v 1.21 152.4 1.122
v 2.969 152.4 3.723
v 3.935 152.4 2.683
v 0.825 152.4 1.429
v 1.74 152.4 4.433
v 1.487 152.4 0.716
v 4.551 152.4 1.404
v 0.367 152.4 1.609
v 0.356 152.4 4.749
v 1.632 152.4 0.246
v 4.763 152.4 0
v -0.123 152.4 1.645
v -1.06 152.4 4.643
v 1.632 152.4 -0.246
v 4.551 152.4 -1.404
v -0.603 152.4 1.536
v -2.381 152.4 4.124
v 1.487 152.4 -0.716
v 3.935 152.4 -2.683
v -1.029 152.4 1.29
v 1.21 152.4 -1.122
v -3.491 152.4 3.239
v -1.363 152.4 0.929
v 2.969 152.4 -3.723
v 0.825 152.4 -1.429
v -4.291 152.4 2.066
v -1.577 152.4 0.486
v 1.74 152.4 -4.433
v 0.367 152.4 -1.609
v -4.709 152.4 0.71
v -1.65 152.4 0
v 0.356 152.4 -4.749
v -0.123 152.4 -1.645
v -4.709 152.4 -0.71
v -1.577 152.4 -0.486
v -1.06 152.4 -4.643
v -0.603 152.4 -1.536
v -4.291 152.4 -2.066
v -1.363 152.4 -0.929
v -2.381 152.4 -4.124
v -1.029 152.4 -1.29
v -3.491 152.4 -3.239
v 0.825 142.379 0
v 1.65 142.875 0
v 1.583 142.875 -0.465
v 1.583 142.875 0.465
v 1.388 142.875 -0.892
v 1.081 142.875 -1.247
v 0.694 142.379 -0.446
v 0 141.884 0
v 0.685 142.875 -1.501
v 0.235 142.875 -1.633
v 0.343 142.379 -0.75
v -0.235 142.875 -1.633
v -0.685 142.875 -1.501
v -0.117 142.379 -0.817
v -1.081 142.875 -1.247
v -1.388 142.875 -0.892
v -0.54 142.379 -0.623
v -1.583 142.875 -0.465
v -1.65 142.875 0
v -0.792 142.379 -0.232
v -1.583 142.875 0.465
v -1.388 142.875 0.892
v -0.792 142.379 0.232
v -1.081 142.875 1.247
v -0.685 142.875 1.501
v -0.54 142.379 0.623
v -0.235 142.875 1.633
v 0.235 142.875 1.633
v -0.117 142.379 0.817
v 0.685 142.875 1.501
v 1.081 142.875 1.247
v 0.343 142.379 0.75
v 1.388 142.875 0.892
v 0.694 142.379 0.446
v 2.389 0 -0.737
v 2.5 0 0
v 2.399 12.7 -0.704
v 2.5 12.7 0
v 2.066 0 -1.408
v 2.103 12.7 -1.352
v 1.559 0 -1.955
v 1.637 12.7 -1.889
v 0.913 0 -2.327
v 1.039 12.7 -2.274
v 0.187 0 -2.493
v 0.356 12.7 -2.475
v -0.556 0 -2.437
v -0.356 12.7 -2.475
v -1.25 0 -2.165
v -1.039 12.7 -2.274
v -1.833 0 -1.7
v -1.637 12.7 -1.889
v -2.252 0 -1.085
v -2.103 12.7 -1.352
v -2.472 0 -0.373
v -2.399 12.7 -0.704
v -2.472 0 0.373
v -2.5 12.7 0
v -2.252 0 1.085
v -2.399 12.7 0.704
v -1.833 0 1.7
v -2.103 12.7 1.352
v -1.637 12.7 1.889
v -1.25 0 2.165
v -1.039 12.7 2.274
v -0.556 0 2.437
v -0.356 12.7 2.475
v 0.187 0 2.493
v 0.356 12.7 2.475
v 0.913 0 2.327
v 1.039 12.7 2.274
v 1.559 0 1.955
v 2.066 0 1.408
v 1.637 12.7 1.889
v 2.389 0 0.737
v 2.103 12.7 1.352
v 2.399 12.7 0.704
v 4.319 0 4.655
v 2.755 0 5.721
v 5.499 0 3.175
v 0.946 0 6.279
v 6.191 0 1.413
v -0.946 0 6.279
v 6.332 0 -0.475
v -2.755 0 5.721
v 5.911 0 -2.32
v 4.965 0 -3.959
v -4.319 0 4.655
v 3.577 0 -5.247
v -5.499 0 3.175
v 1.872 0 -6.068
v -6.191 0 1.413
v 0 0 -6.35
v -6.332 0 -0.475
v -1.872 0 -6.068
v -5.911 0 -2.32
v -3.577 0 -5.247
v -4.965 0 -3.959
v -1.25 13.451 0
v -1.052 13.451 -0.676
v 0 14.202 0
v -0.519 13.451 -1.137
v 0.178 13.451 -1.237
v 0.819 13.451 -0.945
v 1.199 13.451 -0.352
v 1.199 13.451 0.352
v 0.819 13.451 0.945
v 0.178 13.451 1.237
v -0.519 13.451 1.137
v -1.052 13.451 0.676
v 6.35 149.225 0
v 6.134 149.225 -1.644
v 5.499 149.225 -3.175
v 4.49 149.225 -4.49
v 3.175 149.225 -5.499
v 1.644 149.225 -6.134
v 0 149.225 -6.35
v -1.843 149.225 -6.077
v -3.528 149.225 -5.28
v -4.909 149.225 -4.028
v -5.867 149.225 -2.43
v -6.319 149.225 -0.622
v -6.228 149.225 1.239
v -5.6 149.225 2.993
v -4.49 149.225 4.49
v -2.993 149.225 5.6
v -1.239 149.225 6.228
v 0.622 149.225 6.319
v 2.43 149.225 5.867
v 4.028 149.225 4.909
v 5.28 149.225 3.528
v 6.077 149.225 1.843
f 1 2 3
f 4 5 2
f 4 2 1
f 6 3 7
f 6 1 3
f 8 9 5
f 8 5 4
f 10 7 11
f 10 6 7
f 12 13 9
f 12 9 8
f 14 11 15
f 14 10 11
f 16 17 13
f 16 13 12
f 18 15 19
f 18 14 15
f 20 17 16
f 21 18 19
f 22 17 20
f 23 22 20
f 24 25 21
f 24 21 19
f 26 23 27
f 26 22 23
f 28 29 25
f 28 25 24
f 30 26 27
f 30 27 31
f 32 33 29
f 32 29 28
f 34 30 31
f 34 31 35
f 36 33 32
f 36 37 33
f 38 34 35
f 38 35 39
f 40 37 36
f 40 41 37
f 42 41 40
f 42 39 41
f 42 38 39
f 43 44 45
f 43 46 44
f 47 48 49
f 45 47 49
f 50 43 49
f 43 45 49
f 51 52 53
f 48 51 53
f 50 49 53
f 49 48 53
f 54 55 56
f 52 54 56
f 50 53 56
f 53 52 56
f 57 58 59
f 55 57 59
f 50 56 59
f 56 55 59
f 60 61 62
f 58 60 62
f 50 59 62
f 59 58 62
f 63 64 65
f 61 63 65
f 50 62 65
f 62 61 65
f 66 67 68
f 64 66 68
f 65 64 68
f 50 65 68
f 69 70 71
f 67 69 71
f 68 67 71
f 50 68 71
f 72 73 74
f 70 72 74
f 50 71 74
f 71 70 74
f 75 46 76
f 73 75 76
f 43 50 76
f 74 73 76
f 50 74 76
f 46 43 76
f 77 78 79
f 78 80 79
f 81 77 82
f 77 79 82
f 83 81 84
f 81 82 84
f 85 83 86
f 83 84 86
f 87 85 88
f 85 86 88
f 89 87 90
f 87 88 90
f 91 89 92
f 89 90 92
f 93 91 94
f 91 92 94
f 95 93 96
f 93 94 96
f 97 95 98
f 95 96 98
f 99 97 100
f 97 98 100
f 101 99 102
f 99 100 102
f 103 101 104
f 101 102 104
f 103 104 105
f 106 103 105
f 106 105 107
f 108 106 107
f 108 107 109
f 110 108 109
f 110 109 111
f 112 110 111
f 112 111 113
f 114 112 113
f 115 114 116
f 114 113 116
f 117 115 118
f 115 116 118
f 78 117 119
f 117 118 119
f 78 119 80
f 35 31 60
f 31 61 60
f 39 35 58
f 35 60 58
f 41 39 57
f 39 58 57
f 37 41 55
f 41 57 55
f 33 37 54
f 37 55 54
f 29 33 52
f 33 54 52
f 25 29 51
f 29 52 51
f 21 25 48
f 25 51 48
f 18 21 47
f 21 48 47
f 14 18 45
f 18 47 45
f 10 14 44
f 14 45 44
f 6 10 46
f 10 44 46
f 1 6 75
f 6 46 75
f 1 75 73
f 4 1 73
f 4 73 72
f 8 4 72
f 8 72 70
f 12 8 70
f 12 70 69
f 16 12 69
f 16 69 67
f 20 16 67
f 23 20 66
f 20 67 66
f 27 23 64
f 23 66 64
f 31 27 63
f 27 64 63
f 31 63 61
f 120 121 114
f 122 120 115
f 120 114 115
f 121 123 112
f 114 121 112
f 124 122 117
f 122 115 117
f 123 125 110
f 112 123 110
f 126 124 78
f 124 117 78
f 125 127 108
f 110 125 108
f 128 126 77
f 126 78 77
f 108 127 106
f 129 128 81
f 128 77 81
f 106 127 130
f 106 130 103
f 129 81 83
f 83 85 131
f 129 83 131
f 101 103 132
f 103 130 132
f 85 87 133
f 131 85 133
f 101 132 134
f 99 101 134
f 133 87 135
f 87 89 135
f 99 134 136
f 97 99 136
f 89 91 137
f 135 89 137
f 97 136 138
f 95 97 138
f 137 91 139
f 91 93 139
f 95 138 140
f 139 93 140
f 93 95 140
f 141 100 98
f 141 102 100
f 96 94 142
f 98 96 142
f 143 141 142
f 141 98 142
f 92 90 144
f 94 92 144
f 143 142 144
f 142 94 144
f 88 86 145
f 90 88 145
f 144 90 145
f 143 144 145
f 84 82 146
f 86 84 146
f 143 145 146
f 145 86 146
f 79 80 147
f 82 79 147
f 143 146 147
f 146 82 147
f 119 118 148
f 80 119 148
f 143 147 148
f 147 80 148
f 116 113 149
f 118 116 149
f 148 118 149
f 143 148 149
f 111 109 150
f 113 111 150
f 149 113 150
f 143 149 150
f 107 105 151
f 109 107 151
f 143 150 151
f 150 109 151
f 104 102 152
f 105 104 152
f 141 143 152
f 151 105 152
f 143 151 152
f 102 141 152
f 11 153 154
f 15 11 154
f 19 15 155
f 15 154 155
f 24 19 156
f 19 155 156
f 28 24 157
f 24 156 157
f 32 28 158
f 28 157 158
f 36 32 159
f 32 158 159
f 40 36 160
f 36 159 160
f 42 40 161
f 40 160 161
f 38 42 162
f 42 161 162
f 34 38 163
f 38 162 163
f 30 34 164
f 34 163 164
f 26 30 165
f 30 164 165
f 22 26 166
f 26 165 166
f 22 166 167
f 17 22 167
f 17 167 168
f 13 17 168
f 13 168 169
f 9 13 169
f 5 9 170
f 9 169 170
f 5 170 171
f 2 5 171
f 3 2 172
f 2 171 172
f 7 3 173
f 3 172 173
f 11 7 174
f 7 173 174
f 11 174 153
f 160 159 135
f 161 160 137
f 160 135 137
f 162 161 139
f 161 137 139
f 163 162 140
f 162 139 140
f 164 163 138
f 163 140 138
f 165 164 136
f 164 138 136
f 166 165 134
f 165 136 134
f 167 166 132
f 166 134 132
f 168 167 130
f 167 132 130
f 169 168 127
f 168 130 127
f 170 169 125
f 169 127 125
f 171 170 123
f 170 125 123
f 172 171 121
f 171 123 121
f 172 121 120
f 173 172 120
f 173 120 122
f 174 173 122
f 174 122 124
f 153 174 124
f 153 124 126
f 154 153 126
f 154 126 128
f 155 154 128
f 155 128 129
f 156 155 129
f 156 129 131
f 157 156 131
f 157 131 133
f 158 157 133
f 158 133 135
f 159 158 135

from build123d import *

# Parameters (mm, degrees)
SKETCH1_R                 = 6.35
POSTBODY_DEPTH            = 152.4
M4X0_7_TAPPED_HOLE1_D     = 3.3
M4X0_7_TAPPED_HOLE1_DEPTH = 9.525
M4X0_7_TAPPED_HOLE1_TIP   = 0.991420021
M6X1_0_TAPPED_HOLE1_D     = 5
M6X1_0_TAPPED_HOLE1_DEPTH = 12.7
M6X1_0_TAPPED_HOLE1_TIP   = 1.502151548


with BuildPart() as part:
    # Sketch1 → PostBody (new body)
    with BuildSketch(Plane(origin=(0, 0, 0), x_dir=(1, 0, 0), z_dir=(0, 1, 0))):
        with Locations(Location((0, 0, 0), (0, 0, 90))):
            Circle(SKETCH1_R)
    extrude(amount=POSTBODY_DEPTH)

    # TopCut: sweep along a path in Sketch5
    with BuildLine(Plane(origin=(0, 152.4, 0), x_dir=(1, 0, 0), z_dir=(0, 1, 0))) as topcut_path:
        CenterArc((0, 0), 4.748740119, 0, 360)
    # Sketch4 → TopCut (sweep, cut)
    with BuildSketch(Plane.XY):
        Polygon((6.35, 152.4), (6.35, 149.225), (4.7625, 152.4), align=None)
    sweep(path=topcut_path.line, mode=Mode.SUBTRACT)

    # M4x0.7 Tapped Hole1
    with Locations(Plane(origin=(0, 152.4, 0), x_dir=(1, 0, 0), z_dir=(0, 1, 0))):
        with Locations((0, 0)):
            Hole(M4X0_7_TAPPED_HOLE1_D / 2, depth=M4X0_7_TAPPED_HOLE1_DEPTH)
            with Locations((0, 0, -(M4X0_7_TAPPED_HOLE1_DEPTH + M4X0_7_TAPPED_HOLE1_TIP / 2))):  # 118° drill point
                Cone(0, M4X0_7_TAPPED_HOLE1_D / 2, M4X0_7_TAPPED_HOLE1_TIP, mode=Mode.SUBTRACT)

    # M6x1.0 Tapped Hole1
    with Locations(Plane(origin=(0, 0, 0), x_dir=(-1, 0, 0), z_dir=(0, -1, 0))):
        with Locations((0, 0)):
            Hole(M6X1_0_TAPPED_HOLE1_D / 2, depth=M6X1_0_TAPPED_HOLE1_DEPTH)
            with Locations((0, 0, -(M6X1_0_TAPPED_HOLE1_DEPTH + M6X1_0_TAPPED_HOLE1_TIP / 2))):  # 118° drill point
                Cone(0, M6X1_0_TAPPED_HOLE1_D / 2, M6X1_0_TAPPED_HOLE1_TIP, mode=Mode.SUBTRACT)


solid = part.part
